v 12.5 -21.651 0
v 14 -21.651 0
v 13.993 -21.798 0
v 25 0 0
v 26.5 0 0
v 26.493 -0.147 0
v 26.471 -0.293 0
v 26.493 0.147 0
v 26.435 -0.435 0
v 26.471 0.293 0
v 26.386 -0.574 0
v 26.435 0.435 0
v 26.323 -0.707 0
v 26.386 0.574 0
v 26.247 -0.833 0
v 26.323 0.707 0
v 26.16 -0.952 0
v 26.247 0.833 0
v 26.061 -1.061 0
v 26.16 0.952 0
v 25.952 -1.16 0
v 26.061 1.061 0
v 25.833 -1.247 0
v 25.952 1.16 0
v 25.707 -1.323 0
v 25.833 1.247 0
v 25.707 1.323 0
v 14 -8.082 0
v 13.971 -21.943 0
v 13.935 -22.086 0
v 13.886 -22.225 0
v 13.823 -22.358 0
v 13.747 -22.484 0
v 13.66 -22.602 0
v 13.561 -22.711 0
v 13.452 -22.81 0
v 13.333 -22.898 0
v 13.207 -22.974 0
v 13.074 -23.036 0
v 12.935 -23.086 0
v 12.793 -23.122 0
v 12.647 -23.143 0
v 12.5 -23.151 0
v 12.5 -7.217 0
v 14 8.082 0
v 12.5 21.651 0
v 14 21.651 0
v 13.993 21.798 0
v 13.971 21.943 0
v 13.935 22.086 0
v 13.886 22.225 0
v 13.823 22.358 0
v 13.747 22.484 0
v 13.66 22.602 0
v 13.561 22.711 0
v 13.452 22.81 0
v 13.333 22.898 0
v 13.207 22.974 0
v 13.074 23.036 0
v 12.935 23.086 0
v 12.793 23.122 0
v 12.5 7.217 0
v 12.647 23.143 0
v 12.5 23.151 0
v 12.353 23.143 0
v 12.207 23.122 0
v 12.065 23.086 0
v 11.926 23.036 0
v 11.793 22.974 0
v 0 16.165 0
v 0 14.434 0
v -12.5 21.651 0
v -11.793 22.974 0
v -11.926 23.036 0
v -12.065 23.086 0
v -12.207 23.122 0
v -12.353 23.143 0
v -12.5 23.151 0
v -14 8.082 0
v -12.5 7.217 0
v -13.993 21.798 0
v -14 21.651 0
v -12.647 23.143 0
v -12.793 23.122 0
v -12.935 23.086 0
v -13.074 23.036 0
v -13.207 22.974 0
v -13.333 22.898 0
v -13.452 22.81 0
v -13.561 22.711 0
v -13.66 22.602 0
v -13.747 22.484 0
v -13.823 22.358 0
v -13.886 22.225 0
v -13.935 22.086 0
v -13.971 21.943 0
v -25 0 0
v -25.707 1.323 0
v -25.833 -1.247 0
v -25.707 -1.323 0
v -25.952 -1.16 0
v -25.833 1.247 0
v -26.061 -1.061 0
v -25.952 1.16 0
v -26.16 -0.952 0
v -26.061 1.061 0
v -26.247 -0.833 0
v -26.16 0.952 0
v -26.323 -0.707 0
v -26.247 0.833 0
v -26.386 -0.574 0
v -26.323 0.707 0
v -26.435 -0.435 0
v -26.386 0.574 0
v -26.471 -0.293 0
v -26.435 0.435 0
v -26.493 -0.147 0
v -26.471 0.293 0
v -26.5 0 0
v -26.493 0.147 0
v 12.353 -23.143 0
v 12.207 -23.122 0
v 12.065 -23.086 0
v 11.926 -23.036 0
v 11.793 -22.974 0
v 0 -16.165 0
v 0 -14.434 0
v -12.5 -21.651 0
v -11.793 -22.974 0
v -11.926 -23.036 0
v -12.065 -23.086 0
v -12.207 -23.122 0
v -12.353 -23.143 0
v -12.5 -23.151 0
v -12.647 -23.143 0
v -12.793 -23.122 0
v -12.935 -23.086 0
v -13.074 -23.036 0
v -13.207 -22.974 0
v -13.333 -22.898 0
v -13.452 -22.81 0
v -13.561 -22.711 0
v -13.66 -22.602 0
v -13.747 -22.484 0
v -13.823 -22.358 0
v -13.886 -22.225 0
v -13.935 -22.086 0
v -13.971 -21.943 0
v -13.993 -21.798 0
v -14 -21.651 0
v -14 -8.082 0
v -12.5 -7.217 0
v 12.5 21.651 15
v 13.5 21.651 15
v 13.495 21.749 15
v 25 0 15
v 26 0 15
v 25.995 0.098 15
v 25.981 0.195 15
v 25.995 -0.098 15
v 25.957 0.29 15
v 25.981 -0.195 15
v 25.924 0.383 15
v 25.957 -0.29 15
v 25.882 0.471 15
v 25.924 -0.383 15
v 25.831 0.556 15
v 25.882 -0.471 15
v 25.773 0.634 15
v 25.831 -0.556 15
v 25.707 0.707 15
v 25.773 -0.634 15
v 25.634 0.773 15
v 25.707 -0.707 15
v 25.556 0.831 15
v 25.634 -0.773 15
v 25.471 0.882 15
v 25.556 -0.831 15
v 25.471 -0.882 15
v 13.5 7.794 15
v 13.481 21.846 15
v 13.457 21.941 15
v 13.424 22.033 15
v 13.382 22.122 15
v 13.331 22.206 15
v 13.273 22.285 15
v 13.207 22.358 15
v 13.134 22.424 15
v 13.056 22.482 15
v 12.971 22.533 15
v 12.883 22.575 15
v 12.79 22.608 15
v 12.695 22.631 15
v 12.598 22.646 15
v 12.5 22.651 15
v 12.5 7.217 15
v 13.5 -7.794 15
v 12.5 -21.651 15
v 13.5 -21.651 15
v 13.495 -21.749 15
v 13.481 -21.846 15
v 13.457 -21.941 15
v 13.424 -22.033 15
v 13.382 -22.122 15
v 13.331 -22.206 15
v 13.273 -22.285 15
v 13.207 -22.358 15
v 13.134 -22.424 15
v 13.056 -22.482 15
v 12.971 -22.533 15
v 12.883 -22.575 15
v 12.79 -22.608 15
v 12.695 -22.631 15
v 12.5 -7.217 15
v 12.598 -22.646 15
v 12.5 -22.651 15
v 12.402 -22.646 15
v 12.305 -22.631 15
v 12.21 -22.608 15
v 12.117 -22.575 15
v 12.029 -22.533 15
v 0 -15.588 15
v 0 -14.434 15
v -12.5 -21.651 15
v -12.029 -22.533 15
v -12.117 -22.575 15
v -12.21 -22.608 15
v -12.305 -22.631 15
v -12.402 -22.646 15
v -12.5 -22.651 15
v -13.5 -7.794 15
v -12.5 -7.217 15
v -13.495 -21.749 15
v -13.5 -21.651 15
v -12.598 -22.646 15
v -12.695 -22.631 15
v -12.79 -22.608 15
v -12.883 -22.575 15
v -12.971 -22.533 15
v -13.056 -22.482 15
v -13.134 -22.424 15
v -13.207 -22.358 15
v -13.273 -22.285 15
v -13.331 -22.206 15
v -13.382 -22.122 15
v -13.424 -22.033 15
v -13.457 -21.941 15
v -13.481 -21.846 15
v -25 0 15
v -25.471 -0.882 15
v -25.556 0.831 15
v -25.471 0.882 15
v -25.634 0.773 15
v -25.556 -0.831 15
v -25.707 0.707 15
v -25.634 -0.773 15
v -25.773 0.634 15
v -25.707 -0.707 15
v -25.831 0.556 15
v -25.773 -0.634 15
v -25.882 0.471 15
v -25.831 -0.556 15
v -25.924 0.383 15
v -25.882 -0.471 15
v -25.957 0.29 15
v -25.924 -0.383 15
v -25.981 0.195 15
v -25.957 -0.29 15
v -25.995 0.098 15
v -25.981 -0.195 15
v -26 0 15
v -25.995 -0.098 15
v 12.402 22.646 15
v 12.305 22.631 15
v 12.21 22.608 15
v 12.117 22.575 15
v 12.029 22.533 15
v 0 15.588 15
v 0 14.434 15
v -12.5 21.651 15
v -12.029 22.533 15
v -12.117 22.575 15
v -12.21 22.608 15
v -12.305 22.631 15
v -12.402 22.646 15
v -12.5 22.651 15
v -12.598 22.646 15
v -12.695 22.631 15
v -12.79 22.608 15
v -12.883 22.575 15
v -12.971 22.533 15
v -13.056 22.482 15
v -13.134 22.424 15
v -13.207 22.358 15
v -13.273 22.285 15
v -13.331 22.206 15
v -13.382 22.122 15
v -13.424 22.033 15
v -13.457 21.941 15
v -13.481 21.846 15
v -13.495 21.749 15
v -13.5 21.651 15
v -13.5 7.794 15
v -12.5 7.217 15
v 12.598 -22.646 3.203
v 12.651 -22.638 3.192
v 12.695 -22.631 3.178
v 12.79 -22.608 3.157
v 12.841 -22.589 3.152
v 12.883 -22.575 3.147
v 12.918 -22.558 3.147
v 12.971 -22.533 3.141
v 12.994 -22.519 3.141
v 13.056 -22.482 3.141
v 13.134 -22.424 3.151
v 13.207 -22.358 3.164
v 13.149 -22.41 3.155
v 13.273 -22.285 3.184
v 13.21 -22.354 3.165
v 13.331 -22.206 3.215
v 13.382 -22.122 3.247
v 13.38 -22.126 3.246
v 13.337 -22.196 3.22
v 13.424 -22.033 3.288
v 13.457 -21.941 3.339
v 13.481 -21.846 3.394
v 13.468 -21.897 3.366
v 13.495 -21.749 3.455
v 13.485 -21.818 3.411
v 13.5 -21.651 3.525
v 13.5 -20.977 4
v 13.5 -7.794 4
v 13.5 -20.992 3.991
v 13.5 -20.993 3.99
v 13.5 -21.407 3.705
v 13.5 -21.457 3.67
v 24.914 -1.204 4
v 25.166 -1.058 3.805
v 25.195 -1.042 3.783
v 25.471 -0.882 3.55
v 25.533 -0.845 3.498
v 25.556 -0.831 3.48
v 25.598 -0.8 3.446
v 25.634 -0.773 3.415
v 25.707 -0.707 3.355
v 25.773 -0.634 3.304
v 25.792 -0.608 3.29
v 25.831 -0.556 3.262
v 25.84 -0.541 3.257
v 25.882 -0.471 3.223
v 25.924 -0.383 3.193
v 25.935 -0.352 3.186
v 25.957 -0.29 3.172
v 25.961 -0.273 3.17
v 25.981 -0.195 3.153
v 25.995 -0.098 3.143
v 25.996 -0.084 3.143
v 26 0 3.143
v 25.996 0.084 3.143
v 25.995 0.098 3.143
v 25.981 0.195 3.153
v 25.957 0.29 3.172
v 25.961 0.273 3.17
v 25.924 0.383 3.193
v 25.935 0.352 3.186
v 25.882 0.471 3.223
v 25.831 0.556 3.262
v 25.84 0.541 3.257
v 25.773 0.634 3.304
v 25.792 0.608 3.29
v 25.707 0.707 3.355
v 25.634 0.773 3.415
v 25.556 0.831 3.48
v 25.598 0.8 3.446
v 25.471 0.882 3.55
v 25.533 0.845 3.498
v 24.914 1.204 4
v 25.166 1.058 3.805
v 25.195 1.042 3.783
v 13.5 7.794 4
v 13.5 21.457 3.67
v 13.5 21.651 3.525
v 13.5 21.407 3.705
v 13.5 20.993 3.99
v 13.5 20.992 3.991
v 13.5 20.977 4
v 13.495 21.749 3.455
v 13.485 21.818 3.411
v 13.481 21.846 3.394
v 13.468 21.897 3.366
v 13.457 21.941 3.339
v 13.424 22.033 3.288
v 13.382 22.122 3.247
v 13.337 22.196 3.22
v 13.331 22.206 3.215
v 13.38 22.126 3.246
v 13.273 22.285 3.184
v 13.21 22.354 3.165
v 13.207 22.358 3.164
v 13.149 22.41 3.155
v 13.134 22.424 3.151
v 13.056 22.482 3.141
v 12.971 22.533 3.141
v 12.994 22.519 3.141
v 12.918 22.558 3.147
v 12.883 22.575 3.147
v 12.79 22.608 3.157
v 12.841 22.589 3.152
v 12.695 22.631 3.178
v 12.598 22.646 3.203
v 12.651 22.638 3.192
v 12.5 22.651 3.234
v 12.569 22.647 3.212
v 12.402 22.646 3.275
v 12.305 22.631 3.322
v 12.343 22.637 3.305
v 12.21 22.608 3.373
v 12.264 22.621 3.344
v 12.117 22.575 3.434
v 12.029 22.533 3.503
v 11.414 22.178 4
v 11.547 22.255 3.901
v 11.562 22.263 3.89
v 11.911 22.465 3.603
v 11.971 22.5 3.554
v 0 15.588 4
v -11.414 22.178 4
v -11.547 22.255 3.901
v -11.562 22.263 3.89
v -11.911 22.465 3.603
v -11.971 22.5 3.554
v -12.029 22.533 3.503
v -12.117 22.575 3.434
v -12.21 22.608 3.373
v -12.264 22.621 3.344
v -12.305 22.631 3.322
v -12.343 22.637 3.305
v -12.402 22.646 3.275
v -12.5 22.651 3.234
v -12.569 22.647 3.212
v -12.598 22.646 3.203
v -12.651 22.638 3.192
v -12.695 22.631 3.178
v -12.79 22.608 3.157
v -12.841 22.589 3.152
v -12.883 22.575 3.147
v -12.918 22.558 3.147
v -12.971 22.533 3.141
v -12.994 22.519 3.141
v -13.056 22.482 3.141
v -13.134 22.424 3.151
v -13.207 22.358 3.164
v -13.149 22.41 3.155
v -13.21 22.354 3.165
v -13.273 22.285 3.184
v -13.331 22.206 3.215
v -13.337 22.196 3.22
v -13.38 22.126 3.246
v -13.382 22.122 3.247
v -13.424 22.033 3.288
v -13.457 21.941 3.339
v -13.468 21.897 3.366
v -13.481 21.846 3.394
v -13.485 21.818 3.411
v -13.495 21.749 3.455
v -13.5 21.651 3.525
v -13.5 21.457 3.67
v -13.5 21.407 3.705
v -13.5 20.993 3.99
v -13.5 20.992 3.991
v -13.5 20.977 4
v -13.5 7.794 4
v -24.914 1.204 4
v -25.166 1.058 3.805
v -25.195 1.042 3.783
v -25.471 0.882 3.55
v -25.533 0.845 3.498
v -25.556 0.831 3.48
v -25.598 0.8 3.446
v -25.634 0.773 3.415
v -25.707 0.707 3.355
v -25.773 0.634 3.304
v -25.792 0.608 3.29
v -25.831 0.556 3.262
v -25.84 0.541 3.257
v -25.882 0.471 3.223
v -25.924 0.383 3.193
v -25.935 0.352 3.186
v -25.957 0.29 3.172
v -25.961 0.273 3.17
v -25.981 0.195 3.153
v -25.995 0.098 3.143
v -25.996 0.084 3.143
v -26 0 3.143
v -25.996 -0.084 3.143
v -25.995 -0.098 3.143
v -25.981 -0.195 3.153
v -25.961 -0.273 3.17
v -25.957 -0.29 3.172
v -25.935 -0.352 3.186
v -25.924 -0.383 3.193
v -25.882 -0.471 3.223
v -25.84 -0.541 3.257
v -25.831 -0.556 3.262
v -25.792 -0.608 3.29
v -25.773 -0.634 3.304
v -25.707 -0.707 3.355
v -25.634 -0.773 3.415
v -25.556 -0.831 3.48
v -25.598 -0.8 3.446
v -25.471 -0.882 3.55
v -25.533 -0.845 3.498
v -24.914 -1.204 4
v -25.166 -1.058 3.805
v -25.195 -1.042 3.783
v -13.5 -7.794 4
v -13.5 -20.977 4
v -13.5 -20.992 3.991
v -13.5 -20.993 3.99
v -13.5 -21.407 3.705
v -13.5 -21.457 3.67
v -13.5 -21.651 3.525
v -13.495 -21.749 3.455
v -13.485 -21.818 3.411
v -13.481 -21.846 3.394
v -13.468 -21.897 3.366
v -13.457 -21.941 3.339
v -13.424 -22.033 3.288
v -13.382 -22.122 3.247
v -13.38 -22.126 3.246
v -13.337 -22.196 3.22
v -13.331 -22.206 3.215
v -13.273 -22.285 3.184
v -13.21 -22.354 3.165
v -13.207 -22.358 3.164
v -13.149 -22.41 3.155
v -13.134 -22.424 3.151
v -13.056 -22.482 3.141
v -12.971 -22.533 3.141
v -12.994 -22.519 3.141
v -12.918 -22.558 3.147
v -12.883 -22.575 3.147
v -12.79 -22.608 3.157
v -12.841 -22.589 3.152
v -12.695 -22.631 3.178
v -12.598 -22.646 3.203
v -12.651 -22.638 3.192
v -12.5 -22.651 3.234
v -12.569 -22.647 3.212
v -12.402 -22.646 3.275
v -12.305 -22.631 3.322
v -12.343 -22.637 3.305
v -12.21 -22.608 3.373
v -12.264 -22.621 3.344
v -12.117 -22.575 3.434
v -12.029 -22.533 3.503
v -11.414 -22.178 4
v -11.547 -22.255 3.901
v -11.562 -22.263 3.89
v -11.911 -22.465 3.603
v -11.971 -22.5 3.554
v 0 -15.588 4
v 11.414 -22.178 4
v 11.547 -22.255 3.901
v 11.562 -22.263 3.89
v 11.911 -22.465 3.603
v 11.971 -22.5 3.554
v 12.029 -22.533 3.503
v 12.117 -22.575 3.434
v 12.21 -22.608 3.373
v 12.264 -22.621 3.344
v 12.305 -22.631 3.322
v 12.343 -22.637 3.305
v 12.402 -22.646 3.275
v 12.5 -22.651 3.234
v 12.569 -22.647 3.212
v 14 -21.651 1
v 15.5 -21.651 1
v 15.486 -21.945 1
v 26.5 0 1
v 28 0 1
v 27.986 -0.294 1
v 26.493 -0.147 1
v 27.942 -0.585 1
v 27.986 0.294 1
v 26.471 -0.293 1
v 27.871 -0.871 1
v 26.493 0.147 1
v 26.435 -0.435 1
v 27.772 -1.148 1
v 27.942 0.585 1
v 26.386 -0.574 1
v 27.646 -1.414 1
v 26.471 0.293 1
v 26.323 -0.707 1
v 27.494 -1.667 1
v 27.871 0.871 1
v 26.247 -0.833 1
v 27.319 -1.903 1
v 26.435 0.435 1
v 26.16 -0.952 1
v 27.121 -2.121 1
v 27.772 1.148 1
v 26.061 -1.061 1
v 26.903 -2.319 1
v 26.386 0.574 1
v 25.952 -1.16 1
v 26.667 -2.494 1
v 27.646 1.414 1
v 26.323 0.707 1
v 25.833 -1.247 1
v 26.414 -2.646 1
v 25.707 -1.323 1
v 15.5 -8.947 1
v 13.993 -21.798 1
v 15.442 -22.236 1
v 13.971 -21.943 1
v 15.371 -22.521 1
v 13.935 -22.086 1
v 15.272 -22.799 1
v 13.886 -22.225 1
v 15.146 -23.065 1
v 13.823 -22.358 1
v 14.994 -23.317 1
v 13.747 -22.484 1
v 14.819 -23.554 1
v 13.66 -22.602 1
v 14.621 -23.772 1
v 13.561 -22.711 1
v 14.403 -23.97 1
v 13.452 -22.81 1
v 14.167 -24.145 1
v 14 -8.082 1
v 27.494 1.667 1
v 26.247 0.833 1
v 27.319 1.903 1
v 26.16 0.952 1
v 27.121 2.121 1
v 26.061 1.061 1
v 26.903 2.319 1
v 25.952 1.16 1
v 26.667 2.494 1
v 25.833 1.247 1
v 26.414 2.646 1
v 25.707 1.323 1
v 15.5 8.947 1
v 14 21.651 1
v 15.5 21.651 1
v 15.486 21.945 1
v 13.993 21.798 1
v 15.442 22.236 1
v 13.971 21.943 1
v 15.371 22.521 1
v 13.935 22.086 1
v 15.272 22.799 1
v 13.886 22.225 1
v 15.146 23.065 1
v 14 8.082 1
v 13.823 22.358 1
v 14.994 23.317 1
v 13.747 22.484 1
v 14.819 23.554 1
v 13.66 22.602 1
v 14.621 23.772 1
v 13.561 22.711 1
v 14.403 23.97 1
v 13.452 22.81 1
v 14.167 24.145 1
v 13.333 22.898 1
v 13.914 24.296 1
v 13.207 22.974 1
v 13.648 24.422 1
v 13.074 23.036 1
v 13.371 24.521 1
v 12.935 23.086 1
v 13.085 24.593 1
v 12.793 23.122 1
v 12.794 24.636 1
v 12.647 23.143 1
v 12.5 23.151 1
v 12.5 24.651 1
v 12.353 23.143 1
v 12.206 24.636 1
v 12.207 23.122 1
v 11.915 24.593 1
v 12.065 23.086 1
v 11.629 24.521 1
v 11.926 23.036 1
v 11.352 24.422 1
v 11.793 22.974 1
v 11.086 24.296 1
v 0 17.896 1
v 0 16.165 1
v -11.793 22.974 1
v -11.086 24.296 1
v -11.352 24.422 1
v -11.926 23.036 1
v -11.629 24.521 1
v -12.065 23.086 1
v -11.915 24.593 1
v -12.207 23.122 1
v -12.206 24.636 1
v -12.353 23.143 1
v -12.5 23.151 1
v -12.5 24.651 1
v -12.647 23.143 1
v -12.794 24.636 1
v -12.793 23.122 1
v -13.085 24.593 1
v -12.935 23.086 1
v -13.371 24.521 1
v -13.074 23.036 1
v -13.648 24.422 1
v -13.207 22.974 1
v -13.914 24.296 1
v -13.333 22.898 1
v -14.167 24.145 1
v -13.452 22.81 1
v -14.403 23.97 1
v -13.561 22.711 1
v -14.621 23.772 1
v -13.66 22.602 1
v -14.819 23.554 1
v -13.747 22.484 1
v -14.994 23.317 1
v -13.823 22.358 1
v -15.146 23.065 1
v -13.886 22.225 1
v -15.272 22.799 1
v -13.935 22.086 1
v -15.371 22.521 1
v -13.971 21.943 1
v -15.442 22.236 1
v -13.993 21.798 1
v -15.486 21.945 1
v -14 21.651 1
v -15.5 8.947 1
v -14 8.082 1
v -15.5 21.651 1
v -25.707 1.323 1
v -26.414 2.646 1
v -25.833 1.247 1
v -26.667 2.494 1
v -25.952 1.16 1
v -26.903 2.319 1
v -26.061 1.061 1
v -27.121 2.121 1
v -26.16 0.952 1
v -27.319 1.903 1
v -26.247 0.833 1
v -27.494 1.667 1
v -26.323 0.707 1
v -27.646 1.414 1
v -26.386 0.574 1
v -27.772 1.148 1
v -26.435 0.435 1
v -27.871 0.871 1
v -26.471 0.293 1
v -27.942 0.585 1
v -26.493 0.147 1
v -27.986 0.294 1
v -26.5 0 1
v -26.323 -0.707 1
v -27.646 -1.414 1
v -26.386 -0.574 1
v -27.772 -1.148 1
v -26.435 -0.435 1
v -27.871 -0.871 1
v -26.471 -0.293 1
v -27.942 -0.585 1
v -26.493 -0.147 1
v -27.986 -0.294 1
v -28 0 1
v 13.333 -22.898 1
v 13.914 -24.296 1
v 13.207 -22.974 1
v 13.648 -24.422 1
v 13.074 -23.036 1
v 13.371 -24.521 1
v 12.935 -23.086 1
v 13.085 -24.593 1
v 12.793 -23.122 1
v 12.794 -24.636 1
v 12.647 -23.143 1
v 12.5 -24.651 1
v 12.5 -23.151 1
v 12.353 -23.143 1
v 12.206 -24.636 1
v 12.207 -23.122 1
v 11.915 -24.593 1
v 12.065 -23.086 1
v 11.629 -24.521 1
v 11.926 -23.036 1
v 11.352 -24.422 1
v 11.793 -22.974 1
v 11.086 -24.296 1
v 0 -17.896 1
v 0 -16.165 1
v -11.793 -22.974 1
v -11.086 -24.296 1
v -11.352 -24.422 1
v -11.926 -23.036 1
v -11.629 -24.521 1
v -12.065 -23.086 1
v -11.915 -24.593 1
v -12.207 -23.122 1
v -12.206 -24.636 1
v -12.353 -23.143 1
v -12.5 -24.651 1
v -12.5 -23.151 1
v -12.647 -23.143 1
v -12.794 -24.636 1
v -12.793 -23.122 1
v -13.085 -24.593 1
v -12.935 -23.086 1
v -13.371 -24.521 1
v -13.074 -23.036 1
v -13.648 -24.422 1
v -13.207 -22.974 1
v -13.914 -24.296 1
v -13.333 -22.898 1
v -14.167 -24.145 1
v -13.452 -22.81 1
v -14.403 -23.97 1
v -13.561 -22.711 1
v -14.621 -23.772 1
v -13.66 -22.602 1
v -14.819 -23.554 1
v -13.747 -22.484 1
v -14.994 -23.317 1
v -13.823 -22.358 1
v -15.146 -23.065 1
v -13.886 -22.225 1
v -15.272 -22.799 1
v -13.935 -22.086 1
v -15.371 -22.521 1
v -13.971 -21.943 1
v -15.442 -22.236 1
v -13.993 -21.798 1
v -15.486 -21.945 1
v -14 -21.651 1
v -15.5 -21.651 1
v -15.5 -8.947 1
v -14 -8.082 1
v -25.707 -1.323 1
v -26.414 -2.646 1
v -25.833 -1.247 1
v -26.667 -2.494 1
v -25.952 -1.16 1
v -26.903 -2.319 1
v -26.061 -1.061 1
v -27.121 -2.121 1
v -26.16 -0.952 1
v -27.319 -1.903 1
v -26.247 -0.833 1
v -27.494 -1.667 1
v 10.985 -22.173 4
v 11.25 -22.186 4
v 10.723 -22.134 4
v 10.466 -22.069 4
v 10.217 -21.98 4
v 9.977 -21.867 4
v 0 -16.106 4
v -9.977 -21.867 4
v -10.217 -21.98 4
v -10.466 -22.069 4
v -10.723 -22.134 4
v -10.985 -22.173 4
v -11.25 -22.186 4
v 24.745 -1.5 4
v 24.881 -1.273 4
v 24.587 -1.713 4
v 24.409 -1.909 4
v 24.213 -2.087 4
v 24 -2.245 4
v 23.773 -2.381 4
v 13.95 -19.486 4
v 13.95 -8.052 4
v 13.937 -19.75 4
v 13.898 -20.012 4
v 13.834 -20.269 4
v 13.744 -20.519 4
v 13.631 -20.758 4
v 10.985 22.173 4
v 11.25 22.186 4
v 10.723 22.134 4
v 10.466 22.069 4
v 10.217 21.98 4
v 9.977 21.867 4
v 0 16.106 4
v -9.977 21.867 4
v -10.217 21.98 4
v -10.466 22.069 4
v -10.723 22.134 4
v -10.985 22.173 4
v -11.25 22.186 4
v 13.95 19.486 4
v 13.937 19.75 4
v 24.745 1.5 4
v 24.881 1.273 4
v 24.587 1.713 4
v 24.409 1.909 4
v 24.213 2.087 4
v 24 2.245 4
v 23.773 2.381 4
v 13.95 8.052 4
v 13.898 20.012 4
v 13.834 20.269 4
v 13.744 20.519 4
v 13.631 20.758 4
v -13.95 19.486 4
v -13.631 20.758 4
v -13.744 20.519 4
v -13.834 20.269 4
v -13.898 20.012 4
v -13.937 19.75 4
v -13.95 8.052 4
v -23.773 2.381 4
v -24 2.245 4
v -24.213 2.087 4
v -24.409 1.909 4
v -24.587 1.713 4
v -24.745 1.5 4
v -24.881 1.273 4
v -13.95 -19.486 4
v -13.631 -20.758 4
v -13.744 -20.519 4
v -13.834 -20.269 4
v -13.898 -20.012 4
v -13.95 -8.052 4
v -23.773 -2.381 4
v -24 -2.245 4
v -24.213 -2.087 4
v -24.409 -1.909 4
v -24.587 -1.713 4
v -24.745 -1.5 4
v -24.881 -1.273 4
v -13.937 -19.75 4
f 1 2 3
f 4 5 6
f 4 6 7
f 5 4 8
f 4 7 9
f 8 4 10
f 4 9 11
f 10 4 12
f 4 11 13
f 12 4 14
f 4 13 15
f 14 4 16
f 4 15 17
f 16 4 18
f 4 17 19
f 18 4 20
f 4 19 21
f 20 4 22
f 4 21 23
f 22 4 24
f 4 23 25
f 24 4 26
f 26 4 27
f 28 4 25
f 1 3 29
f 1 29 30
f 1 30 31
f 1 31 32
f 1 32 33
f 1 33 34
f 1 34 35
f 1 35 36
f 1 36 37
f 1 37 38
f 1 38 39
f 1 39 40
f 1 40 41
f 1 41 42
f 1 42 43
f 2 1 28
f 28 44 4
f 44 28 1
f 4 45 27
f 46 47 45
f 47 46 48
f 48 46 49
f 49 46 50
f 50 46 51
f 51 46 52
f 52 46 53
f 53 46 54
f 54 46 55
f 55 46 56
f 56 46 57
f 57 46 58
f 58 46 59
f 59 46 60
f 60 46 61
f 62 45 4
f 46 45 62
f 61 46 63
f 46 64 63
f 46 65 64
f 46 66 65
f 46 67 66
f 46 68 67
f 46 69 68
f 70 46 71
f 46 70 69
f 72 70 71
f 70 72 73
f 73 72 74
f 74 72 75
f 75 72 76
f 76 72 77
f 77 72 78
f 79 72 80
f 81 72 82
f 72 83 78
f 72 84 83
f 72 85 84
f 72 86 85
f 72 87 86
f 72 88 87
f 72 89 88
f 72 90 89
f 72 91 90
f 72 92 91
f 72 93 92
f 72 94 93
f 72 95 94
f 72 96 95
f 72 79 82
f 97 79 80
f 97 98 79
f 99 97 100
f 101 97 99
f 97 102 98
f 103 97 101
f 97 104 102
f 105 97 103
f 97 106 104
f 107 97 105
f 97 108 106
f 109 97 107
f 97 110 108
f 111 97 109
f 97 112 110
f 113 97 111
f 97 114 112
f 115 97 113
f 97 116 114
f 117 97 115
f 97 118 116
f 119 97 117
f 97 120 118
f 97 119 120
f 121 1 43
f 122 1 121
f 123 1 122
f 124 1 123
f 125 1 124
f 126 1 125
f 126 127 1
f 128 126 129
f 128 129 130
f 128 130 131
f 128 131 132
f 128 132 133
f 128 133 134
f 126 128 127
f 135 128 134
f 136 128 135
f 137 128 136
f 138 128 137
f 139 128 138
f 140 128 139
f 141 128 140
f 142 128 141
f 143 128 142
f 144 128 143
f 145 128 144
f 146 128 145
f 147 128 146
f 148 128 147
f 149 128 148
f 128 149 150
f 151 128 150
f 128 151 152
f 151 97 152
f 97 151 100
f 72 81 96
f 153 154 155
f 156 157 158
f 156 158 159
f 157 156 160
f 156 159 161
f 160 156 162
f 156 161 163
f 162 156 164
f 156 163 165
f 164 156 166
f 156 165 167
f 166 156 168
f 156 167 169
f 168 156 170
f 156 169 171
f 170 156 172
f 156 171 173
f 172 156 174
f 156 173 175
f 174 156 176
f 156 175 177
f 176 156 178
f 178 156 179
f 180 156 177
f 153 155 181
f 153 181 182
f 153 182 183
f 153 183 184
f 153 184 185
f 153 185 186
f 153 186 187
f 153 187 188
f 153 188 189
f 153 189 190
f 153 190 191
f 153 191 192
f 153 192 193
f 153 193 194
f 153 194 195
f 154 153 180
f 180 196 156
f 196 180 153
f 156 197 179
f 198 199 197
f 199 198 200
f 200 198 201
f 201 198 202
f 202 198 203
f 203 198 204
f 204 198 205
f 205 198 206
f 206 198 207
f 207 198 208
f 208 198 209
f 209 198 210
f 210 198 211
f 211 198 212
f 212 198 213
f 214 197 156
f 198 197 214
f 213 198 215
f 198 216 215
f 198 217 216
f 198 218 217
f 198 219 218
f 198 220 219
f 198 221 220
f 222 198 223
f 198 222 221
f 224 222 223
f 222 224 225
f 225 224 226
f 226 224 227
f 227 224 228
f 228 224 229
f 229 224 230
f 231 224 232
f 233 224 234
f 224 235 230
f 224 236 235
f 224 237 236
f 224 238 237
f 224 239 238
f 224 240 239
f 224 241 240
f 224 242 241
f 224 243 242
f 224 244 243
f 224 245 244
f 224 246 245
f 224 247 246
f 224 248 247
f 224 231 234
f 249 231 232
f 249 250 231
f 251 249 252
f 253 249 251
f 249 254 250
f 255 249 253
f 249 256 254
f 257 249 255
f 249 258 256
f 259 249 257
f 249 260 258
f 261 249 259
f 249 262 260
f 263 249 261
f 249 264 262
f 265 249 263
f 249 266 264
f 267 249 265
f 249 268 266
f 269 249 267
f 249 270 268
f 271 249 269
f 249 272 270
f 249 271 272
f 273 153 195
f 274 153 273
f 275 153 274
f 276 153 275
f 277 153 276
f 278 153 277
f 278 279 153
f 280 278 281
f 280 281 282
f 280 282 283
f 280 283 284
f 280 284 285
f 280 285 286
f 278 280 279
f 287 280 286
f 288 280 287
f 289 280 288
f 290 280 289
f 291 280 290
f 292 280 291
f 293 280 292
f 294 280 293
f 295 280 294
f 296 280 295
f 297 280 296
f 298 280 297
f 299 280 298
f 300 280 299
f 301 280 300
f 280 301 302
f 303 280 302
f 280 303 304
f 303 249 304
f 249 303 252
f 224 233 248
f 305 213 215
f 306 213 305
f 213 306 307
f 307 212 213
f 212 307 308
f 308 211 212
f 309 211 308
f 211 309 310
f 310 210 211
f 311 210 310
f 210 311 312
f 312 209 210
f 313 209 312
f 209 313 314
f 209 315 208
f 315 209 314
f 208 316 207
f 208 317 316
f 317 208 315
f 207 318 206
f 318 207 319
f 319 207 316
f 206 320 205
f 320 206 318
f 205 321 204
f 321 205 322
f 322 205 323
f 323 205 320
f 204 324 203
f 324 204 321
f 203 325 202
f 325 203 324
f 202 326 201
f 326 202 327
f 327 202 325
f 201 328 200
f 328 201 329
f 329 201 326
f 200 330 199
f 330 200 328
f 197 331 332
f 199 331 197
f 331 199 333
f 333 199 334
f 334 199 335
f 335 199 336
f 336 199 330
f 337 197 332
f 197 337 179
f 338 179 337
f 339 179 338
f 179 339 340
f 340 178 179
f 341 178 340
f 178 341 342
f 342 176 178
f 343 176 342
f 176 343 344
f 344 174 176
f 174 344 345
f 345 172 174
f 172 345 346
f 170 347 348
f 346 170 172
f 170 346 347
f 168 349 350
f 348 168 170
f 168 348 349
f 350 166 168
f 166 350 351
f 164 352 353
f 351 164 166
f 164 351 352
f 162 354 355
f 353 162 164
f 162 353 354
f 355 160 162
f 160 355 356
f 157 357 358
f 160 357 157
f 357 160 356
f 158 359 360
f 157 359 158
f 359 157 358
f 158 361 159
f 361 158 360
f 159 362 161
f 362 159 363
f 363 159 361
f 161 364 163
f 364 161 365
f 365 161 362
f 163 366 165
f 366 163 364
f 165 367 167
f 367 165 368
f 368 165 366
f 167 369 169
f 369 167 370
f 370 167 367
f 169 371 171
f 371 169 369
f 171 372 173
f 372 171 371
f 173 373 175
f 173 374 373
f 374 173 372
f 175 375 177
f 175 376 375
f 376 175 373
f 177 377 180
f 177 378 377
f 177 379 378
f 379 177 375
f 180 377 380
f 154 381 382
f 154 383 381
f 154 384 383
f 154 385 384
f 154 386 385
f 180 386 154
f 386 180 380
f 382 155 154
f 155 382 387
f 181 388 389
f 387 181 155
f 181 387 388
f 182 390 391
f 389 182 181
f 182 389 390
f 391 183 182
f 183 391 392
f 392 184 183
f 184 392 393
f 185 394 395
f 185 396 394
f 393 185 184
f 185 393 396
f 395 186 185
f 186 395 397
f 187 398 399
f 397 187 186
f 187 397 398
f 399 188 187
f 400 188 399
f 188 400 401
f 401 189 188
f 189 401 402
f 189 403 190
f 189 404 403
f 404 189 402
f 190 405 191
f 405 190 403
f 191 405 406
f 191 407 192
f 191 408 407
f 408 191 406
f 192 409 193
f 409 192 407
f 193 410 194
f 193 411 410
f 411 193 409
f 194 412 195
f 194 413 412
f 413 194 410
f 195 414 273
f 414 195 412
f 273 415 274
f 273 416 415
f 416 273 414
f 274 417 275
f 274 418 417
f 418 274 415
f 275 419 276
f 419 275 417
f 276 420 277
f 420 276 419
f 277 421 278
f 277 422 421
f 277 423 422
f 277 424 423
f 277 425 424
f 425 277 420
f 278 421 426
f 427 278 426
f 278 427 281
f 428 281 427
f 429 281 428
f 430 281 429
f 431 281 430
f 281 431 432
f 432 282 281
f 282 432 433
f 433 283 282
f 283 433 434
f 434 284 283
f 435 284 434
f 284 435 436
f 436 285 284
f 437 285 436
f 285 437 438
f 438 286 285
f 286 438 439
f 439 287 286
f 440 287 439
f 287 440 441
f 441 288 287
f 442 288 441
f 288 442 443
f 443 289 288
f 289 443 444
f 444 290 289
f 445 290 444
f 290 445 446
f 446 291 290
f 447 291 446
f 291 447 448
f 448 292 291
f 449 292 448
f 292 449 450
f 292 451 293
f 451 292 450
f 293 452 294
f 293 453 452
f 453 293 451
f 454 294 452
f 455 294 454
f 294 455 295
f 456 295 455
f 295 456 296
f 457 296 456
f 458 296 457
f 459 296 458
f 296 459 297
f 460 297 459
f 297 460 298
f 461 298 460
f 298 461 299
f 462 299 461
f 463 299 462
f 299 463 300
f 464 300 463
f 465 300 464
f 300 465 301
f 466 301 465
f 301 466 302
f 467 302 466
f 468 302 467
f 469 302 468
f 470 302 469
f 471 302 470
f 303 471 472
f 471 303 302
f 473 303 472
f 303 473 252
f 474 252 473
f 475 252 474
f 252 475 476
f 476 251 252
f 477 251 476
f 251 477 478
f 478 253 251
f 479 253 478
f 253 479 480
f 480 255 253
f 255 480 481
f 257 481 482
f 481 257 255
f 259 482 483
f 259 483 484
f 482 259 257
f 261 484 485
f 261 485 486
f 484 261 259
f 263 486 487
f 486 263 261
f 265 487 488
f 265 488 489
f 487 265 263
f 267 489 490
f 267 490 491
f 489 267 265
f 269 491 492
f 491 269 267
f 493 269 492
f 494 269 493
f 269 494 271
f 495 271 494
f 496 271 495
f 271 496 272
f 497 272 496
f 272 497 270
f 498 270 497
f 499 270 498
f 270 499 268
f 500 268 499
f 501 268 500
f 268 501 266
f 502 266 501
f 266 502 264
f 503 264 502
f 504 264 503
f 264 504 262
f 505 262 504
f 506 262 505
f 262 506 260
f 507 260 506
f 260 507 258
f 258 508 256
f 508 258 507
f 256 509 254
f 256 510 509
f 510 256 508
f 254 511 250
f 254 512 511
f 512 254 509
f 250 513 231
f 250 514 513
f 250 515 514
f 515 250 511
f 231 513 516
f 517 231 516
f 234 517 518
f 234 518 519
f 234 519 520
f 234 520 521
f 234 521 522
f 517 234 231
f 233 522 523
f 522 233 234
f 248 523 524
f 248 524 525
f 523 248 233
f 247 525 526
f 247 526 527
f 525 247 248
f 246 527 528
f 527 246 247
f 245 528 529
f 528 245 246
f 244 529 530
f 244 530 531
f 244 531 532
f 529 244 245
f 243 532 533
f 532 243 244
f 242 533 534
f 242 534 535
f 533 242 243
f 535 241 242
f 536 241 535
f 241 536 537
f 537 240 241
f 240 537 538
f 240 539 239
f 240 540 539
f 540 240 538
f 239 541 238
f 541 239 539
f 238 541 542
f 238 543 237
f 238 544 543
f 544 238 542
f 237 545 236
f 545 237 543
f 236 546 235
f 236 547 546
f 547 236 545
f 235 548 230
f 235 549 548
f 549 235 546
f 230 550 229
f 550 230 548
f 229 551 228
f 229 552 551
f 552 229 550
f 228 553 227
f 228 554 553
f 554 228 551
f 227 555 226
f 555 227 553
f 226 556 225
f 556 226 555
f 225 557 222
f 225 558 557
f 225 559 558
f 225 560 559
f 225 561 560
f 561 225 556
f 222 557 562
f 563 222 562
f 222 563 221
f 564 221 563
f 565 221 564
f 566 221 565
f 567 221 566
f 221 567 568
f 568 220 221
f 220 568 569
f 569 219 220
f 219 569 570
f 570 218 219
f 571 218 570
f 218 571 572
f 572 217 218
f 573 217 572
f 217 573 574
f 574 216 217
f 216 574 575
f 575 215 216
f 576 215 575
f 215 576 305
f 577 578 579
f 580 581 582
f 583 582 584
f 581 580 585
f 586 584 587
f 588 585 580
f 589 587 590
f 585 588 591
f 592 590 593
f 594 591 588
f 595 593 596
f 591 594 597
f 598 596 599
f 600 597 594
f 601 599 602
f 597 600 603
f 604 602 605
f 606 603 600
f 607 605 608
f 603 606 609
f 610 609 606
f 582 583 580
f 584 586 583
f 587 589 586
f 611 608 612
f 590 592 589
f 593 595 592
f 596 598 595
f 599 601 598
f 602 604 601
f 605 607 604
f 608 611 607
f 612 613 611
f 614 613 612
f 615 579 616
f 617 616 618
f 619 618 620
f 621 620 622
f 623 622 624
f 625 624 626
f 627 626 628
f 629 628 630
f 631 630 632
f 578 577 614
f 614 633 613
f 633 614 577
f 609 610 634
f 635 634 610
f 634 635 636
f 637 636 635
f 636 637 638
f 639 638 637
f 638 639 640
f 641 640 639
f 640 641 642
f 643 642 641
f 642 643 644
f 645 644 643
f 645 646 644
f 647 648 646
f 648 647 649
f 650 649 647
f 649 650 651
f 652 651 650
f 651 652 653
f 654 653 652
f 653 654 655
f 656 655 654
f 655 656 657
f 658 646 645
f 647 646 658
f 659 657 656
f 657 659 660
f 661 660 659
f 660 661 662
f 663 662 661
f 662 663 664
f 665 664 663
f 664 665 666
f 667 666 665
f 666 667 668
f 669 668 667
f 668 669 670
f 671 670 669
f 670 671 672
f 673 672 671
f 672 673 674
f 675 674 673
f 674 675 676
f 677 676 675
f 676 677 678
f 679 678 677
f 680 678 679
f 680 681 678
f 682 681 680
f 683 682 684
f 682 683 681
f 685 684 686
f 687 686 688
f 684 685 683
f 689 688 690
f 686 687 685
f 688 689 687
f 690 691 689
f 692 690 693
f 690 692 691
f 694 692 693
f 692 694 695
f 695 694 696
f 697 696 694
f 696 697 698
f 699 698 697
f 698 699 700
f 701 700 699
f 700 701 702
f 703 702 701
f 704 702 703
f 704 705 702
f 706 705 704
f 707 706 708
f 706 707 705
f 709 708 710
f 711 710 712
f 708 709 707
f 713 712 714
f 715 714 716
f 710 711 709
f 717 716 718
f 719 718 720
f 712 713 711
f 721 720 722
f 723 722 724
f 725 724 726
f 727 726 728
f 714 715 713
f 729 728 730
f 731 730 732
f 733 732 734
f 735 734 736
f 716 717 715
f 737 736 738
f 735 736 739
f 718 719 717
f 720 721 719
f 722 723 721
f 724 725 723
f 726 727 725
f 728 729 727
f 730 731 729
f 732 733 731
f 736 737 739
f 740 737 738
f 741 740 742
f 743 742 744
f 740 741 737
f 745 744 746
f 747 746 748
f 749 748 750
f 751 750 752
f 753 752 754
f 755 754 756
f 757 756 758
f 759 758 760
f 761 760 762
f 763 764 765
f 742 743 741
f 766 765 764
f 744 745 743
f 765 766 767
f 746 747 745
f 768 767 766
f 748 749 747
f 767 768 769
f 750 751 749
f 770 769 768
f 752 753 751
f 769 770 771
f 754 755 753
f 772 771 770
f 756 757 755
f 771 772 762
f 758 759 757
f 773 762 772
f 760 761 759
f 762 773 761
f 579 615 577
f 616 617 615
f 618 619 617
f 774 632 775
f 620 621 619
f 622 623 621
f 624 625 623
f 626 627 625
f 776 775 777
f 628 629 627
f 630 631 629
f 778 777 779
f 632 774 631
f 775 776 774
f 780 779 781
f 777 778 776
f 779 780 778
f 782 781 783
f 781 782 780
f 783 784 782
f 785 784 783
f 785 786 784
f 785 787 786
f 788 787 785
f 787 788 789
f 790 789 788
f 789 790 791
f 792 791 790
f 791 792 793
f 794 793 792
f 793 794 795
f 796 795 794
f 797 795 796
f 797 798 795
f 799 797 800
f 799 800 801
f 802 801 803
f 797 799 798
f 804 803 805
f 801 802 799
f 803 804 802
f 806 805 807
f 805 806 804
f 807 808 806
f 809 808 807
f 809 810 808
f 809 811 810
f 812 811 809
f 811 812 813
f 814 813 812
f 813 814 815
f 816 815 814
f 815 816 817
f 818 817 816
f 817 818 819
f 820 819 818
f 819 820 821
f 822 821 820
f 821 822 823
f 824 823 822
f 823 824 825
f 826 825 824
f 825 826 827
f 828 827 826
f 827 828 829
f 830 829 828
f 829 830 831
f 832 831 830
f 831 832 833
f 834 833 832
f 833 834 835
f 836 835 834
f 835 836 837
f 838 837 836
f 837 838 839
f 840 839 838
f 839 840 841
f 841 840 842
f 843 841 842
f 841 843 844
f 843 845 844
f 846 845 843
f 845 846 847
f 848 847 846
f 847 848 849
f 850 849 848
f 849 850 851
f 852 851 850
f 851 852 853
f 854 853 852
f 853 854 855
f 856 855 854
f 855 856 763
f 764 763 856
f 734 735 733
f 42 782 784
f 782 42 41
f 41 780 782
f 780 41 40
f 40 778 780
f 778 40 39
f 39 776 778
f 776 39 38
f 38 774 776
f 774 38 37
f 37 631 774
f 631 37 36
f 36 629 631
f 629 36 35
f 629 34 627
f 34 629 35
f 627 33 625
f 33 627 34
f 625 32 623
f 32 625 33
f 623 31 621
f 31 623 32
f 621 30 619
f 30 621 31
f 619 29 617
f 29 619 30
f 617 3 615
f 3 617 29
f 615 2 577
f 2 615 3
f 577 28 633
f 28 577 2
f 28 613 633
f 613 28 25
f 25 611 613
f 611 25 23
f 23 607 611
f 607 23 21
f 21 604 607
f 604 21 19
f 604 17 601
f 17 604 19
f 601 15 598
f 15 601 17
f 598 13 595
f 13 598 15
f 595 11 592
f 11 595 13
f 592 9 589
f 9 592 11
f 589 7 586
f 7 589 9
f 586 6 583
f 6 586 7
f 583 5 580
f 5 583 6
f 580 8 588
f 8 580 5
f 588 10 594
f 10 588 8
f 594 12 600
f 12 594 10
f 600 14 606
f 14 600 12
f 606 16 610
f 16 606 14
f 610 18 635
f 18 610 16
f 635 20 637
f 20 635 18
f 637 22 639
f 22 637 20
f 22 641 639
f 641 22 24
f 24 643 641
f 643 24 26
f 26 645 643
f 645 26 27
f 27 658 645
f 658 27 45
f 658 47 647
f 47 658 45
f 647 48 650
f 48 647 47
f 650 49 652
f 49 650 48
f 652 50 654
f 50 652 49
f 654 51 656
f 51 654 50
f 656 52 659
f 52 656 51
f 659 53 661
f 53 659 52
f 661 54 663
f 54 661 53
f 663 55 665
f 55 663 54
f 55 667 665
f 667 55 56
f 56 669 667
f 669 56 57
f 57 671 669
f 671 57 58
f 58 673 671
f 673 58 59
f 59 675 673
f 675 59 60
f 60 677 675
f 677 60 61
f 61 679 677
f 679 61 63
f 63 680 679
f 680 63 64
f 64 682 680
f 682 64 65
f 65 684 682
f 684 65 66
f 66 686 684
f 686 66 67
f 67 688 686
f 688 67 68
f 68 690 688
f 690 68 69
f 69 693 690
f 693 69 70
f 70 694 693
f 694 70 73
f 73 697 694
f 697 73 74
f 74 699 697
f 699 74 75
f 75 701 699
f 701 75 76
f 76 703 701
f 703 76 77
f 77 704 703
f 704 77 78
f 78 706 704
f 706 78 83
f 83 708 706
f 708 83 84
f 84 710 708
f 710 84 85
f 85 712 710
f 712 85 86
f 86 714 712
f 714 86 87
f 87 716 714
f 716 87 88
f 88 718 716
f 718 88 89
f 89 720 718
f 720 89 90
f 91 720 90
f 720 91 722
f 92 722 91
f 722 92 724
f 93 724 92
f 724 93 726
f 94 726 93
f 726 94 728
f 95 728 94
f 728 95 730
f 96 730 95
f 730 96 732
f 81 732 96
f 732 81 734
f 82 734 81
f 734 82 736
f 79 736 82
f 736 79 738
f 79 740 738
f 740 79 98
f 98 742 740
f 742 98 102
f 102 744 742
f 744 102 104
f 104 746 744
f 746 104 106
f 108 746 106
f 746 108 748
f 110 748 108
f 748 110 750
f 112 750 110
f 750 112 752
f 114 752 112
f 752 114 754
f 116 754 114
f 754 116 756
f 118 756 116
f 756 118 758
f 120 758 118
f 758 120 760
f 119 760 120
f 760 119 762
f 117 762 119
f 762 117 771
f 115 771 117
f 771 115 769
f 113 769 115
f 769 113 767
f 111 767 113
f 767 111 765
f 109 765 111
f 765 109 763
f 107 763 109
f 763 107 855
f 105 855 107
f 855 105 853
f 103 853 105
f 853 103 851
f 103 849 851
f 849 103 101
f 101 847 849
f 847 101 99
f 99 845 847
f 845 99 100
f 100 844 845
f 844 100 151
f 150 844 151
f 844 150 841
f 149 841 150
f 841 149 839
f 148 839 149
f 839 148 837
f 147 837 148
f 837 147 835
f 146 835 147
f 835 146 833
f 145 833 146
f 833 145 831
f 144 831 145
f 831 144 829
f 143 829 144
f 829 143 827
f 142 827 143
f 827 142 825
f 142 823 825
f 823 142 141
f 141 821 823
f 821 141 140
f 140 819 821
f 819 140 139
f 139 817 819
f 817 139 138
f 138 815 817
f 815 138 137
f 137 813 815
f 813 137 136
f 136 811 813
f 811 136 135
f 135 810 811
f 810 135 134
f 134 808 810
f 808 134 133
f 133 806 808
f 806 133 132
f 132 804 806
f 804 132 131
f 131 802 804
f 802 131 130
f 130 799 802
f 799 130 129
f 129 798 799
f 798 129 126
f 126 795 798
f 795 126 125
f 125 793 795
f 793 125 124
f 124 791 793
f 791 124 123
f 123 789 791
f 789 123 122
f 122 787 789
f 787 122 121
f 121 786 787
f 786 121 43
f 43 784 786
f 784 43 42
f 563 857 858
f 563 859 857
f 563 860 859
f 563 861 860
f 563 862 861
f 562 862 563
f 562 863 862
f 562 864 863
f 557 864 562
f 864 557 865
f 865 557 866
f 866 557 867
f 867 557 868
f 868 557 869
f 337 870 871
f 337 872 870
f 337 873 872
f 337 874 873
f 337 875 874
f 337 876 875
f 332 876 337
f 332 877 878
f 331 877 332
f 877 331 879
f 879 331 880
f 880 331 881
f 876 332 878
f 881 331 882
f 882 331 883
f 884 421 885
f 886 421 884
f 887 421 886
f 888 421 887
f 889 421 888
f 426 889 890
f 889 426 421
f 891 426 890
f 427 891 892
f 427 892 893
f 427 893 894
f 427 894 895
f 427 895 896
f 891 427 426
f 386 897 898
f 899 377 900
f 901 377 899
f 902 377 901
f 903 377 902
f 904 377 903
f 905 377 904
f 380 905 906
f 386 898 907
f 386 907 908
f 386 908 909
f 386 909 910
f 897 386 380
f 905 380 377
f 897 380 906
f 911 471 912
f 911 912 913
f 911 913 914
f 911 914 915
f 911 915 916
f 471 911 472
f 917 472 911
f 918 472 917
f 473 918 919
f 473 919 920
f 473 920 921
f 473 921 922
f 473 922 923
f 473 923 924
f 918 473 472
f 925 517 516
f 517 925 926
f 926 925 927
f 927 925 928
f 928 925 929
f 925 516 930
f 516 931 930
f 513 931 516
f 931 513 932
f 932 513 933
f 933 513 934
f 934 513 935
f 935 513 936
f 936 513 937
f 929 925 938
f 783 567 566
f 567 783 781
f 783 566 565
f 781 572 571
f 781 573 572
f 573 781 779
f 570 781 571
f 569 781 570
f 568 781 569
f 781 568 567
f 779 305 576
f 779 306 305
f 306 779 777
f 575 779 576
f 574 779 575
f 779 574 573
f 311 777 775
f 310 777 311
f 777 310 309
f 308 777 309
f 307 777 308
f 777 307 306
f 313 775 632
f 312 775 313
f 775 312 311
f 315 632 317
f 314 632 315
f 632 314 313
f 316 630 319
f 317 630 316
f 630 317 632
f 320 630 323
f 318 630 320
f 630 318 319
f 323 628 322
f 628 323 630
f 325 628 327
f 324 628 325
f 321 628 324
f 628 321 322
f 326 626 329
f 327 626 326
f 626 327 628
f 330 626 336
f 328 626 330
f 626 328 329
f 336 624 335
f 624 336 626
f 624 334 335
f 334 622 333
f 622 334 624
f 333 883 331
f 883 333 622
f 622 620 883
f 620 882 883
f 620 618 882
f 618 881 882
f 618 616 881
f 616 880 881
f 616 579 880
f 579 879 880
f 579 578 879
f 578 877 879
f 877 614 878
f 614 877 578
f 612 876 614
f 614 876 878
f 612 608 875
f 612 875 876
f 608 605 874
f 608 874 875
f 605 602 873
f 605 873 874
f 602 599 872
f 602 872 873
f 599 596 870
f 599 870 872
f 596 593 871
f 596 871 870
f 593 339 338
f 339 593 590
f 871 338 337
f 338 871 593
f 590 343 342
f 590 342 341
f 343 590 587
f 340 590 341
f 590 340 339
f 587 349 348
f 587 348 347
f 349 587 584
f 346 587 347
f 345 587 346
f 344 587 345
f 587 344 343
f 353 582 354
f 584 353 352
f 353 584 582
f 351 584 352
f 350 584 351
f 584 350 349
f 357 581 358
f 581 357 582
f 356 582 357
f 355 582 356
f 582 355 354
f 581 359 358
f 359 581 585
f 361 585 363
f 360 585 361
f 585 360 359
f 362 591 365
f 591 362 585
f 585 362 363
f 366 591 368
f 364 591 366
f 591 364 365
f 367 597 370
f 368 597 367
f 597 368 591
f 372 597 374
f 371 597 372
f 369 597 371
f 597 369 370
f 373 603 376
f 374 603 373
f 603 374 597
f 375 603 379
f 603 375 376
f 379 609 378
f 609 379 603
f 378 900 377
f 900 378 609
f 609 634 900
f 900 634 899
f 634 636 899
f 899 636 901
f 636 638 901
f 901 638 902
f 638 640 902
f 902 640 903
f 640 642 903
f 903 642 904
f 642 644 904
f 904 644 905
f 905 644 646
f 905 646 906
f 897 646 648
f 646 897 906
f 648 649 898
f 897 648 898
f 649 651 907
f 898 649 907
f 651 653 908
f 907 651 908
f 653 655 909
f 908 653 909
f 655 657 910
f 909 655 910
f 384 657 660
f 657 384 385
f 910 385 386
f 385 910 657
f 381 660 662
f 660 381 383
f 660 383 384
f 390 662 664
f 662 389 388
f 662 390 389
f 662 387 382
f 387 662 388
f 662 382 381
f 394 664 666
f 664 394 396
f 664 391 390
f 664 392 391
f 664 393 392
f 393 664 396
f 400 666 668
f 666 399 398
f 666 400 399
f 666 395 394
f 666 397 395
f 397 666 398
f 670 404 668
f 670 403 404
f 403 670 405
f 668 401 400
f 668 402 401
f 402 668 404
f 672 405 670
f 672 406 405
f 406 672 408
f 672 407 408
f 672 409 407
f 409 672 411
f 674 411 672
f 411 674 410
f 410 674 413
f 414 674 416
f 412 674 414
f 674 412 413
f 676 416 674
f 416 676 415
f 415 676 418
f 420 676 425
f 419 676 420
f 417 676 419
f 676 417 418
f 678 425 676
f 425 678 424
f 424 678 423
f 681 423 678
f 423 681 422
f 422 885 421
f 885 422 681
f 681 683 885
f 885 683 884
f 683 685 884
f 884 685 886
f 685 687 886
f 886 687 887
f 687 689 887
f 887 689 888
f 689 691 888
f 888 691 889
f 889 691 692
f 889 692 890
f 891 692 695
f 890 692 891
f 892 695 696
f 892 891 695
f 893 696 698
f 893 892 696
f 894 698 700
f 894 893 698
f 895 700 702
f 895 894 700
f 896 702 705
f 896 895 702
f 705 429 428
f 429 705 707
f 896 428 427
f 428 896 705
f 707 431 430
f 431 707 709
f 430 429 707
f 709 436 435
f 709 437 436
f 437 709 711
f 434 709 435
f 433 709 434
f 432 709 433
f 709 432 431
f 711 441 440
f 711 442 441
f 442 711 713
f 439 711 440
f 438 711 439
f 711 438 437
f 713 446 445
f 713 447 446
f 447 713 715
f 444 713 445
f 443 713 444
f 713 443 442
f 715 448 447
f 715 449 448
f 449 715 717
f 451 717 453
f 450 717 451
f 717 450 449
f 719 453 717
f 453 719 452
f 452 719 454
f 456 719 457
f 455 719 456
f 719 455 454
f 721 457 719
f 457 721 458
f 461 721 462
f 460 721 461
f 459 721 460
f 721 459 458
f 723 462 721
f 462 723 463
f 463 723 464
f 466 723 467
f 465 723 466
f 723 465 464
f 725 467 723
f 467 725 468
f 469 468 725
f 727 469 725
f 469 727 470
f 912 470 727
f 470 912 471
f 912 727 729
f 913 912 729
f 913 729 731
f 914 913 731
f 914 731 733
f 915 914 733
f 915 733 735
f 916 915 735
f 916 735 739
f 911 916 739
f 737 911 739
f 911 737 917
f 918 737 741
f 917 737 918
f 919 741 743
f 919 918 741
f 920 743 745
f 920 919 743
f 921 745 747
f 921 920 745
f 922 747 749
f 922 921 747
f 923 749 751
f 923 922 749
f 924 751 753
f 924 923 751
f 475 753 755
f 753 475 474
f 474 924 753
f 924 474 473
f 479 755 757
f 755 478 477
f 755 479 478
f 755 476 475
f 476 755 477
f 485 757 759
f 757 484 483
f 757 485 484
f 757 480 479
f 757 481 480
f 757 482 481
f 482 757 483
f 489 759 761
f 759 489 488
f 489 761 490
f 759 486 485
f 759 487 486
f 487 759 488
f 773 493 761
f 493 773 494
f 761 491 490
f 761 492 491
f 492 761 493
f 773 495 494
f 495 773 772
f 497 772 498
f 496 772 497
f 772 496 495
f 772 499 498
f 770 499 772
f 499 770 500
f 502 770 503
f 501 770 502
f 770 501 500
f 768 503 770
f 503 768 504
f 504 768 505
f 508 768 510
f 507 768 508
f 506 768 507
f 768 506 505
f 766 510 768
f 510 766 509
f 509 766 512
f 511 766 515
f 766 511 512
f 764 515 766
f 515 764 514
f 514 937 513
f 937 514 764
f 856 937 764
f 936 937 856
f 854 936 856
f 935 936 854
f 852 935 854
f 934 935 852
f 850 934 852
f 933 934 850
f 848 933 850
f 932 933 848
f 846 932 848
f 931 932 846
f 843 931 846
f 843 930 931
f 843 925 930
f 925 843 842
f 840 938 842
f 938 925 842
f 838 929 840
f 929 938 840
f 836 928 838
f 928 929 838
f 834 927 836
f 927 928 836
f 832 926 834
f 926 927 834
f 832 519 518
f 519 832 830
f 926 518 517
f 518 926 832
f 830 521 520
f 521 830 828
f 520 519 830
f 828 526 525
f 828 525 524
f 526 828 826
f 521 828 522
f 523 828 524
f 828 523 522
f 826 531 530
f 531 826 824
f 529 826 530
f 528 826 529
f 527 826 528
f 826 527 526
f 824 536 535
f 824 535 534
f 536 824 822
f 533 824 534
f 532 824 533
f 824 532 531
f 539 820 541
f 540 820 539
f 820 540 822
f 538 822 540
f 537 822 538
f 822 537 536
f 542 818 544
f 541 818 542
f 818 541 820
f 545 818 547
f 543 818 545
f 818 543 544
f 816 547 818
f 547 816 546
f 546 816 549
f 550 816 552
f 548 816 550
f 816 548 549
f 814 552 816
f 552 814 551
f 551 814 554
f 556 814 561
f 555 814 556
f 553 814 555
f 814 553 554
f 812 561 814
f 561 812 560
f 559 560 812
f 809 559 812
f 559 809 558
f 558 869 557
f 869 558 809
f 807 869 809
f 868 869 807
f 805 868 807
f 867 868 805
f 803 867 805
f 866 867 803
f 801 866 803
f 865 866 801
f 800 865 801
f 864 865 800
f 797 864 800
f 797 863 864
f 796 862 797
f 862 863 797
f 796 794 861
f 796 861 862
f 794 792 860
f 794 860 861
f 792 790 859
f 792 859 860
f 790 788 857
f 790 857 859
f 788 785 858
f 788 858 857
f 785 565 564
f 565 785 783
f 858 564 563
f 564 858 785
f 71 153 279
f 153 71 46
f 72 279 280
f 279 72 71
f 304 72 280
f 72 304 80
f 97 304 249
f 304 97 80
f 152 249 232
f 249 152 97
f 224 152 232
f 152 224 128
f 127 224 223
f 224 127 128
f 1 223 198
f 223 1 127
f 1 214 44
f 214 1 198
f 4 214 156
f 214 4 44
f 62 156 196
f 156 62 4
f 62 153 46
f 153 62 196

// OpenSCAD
//
// Star-formed cookie cutter
//

$r  = 25; // radius of the circle on which the outer points of the star lie
$h  = 15; // total height of the cutter
$n  =  6; // number of rays
$w  =  1; // wall thickness
$fw =  3; // foot wall thickness
$fh =  1; // foot height

$fn=64;

alpha = 360 / $n;

P = [ for( i=[ 0 : 1 : $n-1 ] ) [ $r * cos( i * alpha ), $r * sin( i * alpha ) ]];

difference() {
    union() {
        linear_extrude( height=$h ) {
            for( i=[ 0 : 1 : $n-1 ] ) {
                minkowski() {
                    polygon( [ [ 0, 0 ], P[i], P[(i+2) % $n ]]);
                    circle( r=$w );
                }
            }
        }
        linear_extrude( height=$fh ) {
            for( i=[ 0 : 1 : $n-1 ] ) {
                minkowski() {
                    polygon( [ [ 0, 0 ], P[i], P[(i+2) % $n ]]);
                    circle( r=$fw/2 );
                }
            }
        }
        // This makes the thing easier to clean
        translate( [0, 0, $fh ] ) {
            linear_extrude( height=$fh*3, scale=0.9 ) {
                for( i=[ 0 : 1 : $n-1 ] ) {
                    minkowski() {
                        polygon( [ [ 0, 0 ], P[i], P[(i+2) % $n ]]);
                        circle( r=$fw );
                    }
                }
            }
        }
    }
    linear_extrude( height=$h ) {
        for( i=[ 0 : 1 : $n-1 ] ) {
            polygon( [ [ 0, 0 ], P[i], P[(i+2) % $n ]]);
        }
    }
}
